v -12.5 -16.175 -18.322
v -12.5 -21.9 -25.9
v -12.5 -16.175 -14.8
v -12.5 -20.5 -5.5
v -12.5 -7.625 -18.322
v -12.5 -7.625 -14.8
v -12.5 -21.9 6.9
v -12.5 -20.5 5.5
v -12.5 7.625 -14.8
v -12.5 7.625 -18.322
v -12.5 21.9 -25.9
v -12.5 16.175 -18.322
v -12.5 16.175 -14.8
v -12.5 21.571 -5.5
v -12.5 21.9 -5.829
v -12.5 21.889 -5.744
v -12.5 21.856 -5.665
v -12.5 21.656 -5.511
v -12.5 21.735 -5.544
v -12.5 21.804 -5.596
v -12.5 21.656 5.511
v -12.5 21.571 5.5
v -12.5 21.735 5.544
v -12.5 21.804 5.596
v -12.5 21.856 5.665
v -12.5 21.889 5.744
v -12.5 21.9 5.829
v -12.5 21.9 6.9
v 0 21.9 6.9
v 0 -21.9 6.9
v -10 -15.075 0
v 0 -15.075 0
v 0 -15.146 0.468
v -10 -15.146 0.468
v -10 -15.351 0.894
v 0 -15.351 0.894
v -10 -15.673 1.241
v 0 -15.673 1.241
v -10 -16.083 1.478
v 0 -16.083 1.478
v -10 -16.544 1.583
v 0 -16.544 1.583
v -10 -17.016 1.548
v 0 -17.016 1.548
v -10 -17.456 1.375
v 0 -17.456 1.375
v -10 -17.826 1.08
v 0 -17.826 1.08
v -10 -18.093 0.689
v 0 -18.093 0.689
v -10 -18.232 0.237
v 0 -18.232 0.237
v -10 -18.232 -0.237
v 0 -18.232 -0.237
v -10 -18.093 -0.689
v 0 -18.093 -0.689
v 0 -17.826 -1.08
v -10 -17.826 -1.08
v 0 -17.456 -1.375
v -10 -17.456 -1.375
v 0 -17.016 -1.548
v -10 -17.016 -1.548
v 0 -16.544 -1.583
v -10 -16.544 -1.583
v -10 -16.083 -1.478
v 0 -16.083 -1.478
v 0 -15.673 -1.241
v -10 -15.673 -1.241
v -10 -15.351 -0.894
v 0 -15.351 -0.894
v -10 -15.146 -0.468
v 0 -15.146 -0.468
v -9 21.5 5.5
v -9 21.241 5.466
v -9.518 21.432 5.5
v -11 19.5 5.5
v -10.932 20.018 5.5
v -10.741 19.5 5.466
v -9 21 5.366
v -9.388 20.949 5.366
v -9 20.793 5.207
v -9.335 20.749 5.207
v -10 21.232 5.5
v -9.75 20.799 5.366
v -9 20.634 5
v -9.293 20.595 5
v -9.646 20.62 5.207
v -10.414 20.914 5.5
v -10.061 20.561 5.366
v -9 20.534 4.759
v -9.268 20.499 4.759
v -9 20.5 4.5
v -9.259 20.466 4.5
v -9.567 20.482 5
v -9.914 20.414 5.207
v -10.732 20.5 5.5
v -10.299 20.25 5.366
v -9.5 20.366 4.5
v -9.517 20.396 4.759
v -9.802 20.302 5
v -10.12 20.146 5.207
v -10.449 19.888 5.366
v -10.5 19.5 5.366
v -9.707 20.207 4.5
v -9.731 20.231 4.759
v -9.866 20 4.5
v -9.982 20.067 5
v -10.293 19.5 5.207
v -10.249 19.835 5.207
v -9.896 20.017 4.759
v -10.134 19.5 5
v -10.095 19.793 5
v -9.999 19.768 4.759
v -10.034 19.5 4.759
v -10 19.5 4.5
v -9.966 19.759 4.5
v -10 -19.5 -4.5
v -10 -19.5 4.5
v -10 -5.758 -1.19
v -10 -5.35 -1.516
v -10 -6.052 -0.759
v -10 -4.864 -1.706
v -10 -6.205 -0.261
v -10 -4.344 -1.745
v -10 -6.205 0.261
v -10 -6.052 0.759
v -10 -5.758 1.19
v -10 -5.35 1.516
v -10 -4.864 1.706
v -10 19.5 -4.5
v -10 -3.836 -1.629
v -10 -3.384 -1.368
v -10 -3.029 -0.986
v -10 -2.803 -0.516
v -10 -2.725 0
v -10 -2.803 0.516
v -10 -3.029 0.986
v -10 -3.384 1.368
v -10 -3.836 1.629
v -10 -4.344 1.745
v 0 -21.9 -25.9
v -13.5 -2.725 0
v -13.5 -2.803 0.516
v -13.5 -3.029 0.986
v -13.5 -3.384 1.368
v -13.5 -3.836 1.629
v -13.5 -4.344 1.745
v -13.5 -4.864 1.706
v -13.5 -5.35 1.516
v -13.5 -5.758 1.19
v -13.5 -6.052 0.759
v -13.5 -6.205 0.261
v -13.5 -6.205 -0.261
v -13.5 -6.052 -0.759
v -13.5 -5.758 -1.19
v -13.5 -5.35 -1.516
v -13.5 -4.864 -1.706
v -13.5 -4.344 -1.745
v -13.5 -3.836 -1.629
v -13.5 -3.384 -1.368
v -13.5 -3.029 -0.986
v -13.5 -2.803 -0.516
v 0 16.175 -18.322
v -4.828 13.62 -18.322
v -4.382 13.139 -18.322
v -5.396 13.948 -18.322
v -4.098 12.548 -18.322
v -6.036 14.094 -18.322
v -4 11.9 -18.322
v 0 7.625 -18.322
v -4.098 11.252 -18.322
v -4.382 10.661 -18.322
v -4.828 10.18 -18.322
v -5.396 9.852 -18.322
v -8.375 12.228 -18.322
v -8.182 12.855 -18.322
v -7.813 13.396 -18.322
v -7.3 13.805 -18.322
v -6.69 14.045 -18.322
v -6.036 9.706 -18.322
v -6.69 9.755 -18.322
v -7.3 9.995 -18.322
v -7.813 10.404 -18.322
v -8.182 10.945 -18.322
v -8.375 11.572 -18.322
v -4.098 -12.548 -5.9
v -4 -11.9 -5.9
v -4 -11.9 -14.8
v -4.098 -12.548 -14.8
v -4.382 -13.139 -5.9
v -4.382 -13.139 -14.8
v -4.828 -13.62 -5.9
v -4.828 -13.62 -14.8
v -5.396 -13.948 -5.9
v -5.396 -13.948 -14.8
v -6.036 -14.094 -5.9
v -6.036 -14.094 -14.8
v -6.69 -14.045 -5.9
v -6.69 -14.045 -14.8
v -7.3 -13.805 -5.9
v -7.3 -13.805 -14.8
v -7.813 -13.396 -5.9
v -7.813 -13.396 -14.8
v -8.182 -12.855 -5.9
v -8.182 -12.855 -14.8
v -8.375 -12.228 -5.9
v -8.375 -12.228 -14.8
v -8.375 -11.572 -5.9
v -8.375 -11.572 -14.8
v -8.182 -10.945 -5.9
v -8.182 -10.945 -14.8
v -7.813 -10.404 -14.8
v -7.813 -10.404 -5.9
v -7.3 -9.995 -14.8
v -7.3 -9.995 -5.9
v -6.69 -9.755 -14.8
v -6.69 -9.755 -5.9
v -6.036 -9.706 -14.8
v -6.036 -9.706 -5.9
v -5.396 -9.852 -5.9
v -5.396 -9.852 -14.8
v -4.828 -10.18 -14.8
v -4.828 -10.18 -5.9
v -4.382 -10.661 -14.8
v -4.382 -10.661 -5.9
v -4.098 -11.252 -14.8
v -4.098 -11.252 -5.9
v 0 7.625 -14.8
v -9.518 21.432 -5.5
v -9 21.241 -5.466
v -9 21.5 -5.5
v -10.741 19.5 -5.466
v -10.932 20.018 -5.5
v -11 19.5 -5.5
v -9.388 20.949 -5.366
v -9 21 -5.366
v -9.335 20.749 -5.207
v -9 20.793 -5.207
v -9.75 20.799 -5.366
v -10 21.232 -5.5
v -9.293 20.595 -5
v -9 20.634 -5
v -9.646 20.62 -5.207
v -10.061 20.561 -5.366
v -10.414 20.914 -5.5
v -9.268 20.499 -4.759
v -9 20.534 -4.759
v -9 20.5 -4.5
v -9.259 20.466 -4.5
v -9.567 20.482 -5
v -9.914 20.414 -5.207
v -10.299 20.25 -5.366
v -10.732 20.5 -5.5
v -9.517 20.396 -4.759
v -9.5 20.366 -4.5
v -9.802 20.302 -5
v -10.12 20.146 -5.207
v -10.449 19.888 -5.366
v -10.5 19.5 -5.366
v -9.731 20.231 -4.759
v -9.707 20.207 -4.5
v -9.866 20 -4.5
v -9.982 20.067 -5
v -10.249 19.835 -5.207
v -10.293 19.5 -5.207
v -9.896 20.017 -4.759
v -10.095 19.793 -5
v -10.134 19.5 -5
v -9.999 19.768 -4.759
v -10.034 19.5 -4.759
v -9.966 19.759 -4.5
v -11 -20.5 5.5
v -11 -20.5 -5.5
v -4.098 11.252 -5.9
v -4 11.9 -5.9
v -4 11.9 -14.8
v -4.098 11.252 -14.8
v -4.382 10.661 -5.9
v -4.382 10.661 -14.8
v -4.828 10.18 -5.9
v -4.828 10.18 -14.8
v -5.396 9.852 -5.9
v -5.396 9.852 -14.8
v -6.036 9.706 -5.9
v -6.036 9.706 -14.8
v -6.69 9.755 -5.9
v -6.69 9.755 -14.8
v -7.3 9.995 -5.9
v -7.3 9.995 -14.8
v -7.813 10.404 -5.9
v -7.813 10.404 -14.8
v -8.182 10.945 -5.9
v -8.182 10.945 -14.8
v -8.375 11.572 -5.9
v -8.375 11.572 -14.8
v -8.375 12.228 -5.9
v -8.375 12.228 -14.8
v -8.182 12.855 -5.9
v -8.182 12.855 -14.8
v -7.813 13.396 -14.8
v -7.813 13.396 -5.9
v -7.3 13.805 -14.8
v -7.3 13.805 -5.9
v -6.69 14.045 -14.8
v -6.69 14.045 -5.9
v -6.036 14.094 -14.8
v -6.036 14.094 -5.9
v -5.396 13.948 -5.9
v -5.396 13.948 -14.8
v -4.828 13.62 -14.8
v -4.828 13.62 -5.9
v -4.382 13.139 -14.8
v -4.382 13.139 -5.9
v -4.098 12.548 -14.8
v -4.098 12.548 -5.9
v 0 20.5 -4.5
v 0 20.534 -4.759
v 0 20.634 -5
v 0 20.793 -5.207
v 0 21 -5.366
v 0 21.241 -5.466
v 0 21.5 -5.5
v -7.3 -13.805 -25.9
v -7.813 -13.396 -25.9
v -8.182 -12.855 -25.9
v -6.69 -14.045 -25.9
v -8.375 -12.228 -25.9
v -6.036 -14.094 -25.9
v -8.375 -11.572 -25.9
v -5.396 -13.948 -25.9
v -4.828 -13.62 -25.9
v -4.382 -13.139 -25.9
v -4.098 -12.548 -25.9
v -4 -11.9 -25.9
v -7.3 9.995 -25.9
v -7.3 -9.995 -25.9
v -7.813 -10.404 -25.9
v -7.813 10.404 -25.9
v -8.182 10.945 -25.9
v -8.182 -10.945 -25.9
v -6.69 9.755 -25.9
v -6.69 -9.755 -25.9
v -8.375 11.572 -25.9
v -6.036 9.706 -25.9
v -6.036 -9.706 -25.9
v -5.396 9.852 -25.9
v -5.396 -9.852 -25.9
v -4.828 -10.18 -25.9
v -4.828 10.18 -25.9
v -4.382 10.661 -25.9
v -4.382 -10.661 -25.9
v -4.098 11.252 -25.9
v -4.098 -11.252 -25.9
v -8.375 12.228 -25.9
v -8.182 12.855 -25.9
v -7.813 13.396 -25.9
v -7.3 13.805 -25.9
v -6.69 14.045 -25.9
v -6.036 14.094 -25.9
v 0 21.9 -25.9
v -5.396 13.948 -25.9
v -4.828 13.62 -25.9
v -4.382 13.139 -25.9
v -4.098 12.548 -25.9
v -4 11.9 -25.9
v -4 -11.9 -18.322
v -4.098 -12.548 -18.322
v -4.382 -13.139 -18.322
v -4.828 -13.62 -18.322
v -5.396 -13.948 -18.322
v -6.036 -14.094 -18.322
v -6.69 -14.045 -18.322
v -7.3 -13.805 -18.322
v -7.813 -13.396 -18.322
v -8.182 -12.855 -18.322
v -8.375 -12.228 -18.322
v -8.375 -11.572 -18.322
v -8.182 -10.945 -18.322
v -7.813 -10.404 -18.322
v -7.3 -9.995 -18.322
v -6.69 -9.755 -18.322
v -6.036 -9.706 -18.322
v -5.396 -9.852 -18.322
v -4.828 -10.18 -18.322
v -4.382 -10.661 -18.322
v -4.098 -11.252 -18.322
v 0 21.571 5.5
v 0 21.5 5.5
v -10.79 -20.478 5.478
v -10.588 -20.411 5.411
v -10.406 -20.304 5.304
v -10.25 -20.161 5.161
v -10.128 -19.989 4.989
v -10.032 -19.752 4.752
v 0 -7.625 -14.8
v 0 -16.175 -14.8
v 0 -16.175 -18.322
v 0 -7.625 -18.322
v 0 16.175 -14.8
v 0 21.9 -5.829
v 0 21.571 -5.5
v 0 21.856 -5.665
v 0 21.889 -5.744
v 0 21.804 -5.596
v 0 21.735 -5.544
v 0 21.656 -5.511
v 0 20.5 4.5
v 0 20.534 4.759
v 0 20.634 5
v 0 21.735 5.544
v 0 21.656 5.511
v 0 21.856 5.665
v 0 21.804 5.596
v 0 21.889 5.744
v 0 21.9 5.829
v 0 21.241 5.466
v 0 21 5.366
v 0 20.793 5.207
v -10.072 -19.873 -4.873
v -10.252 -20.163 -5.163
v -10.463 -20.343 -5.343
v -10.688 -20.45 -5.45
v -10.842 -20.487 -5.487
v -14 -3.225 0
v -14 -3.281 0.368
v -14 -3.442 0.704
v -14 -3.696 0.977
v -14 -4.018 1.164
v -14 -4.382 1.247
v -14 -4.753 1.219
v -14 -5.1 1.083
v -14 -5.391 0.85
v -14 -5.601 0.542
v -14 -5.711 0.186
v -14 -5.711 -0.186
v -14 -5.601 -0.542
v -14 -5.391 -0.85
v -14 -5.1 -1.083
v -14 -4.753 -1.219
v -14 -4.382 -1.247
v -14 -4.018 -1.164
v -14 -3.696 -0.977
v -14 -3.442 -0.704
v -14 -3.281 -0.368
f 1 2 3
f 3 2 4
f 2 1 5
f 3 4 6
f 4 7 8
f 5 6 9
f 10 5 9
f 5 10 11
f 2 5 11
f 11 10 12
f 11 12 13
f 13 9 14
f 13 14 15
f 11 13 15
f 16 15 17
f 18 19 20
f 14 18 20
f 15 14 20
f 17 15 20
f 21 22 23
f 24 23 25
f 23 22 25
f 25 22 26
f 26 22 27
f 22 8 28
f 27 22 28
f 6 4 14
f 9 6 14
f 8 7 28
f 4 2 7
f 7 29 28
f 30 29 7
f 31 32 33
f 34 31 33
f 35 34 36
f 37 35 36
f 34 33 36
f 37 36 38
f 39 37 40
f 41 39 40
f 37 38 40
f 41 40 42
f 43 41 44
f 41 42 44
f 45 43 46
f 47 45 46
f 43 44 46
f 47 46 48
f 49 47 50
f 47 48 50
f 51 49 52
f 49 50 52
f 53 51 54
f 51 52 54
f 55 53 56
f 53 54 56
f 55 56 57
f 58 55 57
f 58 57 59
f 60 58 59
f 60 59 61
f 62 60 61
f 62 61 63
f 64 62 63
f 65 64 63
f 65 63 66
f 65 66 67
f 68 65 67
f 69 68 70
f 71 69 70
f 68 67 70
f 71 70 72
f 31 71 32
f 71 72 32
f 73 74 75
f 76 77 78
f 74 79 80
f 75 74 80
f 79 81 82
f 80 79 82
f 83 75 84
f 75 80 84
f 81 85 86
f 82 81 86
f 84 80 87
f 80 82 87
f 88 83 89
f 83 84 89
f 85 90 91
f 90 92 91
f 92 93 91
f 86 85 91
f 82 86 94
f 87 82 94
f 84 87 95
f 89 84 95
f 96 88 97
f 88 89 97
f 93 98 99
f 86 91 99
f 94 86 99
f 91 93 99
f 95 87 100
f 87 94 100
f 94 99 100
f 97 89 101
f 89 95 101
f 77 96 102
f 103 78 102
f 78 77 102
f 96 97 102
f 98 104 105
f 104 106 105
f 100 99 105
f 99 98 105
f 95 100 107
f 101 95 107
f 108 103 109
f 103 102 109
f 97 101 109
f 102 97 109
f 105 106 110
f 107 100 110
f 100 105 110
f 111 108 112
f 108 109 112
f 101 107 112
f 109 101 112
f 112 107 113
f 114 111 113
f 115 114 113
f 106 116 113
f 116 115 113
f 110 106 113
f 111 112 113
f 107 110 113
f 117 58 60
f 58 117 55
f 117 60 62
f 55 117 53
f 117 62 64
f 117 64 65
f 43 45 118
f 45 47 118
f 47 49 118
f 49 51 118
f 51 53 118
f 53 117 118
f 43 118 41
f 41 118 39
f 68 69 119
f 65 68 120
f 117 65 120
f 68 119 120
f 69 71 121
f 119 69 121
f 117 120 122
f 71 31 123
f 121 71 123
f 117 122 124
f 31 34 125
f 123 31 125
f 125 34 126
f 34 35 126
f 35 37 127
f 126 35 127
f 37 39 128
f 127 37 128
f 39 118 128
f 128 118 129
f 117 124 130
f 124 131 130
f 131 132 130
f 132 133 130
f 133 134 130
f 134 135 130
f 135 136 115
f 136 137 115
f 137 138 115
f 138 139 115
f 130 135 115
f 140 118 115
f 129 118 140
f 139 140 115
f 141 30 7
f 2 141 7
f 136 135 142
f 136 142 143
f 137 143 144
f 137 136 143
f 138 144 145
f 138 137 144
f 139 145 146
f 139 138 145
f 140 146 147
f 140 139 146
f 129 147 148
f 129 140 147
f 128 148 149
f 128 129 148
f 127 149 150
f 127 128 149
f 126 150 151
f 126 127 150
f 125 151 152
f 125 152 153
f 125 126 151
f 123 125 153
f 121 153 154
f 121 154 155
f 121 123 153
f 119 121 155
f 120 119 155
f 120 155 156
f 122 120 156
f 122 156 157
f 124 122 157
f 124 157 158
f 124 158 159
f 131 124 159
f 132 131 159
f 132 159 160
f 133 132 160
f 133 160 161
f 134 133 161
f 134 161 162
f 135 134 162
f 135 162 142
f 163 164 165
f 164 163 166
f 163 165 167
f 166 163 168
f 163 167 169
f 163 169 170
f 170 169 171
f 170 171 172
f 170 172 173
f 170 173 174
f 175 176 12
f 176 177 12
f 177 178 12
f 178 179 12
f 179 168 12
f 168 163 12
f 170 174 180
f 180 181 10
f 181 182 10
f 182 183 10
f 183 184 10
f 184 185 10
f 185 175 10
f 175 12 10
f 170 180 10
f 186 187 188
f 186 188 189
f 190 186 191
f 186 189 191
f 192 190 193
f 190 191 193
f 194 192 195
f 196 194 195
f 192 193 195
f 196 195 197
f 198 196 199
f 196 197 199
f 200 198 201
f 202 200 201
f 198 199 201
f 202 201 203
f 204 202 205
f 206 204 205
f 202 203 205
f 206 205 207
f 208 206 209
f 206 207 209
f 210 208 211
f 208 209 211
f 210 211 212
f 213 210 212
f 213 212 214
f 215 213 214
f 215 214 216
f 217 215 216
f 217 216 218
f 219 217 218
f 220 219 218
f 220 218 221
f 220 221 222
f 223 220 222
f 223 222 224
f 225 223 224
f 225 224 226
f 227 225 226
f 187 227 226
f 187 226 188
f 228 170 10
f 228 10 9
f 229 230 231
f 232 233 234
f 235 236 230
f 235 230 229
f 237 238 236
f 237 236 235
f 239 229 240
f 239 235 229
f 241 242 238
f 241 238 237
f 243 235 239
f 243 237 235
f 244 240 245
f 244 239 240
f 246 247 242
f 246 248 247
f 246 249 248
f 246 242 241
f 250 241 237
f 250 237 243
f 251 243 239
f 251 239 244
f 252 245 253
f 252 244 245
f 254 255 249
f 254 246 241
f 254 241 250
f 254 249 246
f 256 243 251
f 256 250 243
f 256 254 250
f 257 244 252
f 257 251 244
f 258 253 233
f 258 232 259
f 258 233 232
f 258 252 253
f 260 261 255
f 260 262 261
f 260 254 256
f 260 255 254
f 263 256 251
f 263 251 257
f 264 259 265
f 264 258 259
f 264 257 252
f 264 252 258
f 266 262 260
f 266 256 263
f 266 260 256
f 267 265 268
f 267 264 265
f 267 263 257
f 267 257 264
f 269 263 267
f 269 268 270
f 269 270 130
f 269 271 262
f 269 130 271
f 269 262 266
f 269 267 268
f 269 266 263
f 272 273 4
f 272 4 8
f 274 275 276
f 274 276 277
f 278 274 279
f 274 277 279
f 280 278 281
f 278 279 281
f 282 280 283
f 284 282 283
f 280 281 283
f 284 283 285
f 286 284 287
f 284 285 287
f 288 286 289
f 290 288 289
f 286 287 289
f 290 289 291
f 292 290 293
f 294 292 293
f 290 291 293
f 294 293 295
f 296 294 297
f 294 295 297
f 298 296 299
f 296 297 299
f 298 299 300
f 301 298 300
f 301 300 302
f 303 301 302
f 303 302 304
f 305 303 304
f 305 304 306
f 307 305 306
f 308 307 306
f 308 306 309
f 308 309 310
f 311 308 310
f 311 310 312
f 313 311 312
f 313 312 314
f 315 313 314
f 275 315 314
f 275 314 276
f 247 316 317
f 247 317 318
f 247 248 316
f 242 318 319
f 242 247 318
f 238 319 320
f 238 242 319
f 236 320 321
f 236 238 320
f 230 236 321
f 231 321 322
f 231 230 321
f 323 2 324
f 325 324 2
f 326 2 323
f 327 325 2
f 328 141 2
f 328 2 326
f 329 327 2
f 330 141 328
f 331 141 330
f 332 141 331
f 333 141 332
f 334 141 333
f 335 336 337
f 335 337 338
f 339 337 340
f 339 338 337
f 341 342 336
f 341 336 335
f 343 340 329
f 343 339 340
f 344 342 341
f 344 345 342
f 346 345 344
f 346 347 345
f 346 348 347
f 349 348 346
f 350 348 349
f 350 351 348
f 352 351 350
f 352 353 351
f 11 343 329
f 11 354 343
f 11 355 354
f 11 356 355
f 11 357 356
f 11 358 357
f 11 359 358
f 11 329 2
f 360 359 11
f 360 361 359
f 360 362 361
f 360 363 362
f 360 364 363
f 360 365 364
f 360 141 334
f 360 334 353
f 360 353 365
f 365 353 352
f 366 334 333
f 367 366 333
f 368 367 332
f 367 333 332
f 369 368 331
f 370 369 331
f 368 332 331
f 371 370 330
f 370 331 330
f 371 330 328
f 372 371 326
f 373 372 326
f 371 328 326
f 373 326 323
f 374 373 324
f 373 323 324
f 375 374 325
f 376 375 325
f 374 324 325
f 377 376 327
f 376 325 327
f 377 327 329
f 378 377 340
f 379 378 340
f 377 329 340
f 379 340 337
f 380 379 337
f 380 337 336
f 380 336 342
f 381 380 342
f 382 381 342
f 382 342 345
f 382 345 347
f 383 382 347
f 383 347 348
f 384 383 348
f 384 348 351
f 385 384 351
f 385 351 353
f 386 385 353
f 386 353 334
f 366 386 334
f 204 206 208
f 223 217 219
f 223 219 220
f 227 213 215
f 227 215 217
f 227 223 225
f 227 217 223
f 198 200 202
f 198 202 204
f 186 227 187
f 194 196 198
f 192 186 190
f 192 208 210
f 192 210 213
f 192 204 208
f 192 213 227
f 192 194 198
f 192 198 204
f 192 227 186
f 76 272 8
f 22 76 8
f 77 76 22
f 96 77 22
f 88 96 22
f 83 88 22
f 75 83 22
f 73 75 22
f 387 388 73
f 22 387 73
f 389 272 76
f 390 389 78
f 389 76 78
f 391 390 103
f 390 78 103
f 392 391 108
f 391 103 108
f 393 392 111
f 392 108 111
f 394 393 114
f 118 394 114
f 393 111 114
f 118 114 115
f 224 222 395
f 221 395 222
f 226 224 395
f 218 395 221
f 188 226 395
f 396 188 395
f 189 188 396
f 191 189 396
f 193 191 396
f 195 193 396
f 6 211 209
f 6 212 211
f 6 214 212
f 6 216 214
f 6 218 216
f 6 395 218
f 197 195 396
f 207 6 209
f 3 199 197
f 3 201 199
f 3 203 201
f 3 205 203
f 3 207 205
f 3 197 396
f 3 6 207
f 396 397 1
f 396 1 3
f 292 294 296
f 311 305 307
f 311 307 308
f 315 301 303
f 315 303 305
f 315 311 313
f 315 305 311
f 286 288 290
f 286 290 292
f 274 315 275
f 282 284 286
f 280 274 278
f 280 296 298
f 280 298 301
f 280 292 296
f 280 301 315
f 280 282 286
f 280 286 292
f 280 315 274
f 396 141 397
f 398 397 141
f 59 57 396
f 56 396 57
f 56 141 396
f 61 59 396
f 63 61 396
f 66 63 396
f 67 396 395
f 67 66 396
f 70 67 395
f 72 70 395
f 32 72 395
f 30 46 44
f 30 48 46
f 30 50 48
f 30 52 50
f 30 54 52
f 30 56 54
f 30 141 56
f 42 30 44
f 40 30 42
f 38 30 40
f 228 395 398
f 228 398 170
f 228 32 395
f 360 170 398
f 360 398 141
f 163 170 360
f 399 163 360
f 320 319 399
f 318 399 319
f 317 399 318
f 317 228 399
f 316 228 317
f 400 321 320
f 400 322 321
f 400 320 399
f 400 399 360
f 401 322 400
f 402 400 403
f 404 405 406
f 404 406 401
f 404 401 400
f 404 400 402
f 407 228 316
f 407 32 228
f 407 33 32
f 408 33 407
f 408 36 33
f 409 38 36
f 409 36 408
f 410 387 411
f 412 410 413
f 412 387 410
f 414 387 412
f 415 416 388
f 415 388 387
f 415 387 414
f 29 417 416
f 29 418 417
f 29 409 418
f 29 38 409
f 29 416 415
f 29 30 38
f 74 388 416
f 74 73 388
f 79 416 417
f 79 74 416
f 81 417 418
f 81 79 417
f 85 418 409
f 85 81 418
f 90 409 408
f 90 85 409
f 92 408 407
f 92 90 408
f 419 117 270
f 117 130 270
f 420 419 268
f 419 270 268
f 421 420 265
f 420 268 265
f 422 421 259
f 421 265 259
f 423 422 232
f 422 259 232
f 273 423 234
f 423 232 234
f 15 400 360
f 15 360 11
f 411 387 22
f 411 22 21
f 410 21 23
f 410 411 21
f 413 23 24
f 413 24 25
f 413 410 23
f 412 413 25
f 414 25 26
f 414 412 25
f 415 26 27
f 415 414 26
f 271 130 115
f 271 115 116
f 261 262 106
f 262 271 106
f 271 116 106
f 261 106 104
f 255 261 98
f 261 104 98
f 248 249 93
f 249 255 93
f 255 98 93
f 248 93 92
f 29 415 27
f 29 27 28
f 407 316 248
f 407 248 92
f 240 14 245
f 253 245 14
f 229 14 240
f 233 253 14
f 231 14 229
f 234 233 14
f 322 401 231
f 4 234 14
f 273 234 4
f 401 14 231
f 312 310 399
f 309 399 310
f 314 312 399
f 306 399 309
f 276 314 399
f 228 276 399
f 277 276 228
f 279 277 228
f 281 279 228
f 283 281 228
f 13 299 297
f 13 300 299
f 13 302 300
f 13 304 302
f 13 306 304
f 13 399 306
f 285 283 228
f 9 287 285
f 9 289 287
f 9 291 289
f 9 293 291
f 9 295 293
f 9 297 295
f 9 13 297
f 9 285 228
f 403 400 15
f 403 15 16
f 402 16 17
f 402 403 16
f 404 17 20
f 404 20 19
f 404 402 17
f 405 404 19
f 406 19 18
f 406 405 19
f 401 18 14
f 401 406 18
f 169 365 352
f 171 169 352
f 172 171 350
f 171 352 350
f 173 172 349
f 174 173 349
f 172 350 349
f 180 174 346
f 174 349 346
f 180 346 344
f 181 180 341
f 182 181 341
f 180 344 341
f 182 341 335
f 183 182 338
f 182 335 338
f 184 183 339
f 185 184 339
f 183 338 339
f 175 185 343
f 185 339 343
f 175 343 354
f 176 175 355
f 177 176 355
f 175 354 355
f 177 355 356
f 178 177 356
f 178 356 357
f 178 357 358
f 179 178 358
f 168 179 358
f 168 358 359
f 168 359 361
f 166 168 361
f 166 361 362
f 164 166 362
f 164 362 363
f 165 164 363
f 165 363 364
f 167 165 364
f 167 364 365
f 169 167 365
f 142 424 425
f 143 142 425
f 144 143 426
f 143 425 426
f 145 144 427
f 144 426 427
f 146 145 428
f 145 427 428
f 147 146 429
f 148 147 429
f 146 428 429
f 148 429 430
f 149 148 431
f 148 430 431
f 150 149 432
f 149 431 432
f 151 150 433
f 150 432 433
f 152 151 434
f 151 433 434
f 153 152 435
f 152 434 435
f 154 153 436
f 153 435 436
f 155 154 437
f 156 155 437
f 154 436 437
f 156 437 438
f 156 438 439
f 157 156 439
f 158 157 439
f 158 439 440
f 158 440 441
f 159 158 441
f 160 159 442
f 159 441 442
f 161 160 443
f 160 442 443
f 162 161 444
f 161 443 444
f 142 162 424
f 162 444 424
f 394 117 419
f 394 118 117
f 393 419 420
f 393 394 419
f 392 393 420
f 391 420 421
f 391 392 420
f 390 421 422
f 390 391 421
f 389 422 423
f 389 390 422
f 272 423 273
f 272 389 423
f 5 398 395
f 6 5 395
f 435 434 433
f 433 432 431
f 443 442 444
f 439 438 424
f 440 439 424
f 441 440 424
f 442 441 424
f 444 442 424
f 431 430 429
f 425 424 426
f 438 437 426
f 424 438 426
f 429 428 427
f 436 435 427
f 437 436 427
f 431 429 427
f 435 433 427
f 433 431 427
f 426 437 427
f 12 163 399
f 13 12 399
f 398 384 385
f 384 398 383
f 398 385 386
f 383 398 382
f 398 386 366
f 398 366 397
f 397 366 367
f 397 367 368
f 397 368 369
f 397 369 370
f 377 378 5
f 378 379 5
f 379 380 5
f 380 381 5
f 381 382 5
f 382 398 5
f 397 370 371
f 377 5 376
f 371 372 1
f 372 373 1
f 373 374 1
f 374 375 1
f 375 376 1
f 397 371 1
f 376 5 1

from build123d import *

# Parameters (mm, degrees)
F0_W      = 41
F0_H      = 11
F0_R      = 1.5875
F0_R_2    = 1.75
F1_DEPTH  = 10
F2_DEPTH  = 12.5
F3_R      = 1
F4_DEPTH  = 14
F5_SIZE   = 0.5
F6_DEPTH  = 19
F7_R      = 2.2
F8_DEPTH  = 20
F9_W      = 8.55
F9_H      = 3.5222247243
F10_DEPTH = 22.3


with BuildPart() as f1:
    # F0 (on Right) → F1 (new body)
    with BuildSketch(Plane.YZ):
        Rectangle(F0_W, F0_H)
        with Locations((-16.6625, 0)):
            Circle(F0_R, mode=Mode.SUBTRACT)
        with Locations((-4.475, 0)):
            Circle(F0_R_2, mode=Mode.SUBTRACT)
    extrude(amount=-F1_DEPTH)

    # F0 (on Right) → F2 (join)
    with BuildSketch(Plane.YZ):
        with BuildLine():
            Line((-20.5, 5.5), (20.5, 5.5))
            Line((20.5, 5.5), (21.5708505204, 5.5))
            ThreePointArc((21.5708505204, 5.5), (21.8035943853, 5.5964056654), (21.9000000507, 5.8291495303))
            Line((21.9000000507, 5.8291495303), (21.9000000507, 6.9000000507))
            Line((21.9000000507, 6.9000000507), (-21.9000000507, 6.9000000507))
            Line((-21.9000000507, 6.9000000507), (-21.9000000507, -6.9000000507))
            Line((-21.9000000507, -6.9000000507), (21.9000000507, -6.9000000507))
            Line((21.9000000507, -6.9000000507), (21.9000000507, -5.8291495303))
            ThreePointArc((21.9000000507, -5.8291495303), (21.8035943853, -5.5964056654), (21.5708505204, -5.5))
            Line((21.5708505204, -5.5), (20.5, -5.5))
            Line((20.5, -5.5), (-20.5, -5.5))
            Line((-20.5, -5.5), (-20.5, 5.5))
        make_face()
    extrude(amount=-F2_DEPTH)

    # F3
    f3_edges = [f1.edges().sort_by_distance(p)[0] for p in [
        (-10, 0, 5.5),
        (-10, -20.5, 0),
        (-10, 0, -5.5),
        (-10, 20.5, 0),
        (-5, 20.5, -5.5),
        (-5, 20.5, 5.5),
    ]]
    fillet(f3_edges, radius=F3_R)

    # F0 (on Right) → F4 (join)
    with BuildSketch(Plane.YZ):
        with Locations((-4.475, 0)):
            Circle(F0_R_2)
    extrude(amount=-F4_DEPTH)

    # F5
    f5_edges = [f1.edges().sort_by_distance(p)[0] for p in [
        (-14, -6.225, 0),
    ]]
    chamfer(f5_edges, length=F5_SIZE)

    # F6 (add): a face of the model
    f6_faces = [f1.faces().sort_by_distance(p)[0] for p in [
        (-6.25, 0, -6.9000000507),
    ]]
    extrude(f6_faces, amount=F6_DEPTH)

    # F7 (on face) → F8 (cut)
    with BuildSketch(Plane(origin=(0, 0, -25.9000000507), x_dir=(1, 0, 0), z_dir=(0, 0, -1))):
        with Locations((-6.1999997124, 11.8999998271)):
            Circle(F7_R)
        with Locations((-6.1999997124, -11.9000002742)):
            Circle(F7_R)
    extrude(amount=-F8_DEPTH, mode=Mode.SUBTRACT)

    # F9 (on face) → F10 (cut)
    with BuildSketch(Plane(origin=(-12.5, 0, 0), x_dir=(0, -1, 0), z_dir=(-1, 0, 0))):
        with Locations((-11.9000004627, -16.5611151606)):
            Rectangle(F9_W, F9_H)
        with Locations((11.9000000857, -16.5611151606)):
            Rectangle(F9_W, F9_H)
    extrude(amount=-F10_DEPTH, mode=Mode.SUBTRACT)


solid = f1.part
